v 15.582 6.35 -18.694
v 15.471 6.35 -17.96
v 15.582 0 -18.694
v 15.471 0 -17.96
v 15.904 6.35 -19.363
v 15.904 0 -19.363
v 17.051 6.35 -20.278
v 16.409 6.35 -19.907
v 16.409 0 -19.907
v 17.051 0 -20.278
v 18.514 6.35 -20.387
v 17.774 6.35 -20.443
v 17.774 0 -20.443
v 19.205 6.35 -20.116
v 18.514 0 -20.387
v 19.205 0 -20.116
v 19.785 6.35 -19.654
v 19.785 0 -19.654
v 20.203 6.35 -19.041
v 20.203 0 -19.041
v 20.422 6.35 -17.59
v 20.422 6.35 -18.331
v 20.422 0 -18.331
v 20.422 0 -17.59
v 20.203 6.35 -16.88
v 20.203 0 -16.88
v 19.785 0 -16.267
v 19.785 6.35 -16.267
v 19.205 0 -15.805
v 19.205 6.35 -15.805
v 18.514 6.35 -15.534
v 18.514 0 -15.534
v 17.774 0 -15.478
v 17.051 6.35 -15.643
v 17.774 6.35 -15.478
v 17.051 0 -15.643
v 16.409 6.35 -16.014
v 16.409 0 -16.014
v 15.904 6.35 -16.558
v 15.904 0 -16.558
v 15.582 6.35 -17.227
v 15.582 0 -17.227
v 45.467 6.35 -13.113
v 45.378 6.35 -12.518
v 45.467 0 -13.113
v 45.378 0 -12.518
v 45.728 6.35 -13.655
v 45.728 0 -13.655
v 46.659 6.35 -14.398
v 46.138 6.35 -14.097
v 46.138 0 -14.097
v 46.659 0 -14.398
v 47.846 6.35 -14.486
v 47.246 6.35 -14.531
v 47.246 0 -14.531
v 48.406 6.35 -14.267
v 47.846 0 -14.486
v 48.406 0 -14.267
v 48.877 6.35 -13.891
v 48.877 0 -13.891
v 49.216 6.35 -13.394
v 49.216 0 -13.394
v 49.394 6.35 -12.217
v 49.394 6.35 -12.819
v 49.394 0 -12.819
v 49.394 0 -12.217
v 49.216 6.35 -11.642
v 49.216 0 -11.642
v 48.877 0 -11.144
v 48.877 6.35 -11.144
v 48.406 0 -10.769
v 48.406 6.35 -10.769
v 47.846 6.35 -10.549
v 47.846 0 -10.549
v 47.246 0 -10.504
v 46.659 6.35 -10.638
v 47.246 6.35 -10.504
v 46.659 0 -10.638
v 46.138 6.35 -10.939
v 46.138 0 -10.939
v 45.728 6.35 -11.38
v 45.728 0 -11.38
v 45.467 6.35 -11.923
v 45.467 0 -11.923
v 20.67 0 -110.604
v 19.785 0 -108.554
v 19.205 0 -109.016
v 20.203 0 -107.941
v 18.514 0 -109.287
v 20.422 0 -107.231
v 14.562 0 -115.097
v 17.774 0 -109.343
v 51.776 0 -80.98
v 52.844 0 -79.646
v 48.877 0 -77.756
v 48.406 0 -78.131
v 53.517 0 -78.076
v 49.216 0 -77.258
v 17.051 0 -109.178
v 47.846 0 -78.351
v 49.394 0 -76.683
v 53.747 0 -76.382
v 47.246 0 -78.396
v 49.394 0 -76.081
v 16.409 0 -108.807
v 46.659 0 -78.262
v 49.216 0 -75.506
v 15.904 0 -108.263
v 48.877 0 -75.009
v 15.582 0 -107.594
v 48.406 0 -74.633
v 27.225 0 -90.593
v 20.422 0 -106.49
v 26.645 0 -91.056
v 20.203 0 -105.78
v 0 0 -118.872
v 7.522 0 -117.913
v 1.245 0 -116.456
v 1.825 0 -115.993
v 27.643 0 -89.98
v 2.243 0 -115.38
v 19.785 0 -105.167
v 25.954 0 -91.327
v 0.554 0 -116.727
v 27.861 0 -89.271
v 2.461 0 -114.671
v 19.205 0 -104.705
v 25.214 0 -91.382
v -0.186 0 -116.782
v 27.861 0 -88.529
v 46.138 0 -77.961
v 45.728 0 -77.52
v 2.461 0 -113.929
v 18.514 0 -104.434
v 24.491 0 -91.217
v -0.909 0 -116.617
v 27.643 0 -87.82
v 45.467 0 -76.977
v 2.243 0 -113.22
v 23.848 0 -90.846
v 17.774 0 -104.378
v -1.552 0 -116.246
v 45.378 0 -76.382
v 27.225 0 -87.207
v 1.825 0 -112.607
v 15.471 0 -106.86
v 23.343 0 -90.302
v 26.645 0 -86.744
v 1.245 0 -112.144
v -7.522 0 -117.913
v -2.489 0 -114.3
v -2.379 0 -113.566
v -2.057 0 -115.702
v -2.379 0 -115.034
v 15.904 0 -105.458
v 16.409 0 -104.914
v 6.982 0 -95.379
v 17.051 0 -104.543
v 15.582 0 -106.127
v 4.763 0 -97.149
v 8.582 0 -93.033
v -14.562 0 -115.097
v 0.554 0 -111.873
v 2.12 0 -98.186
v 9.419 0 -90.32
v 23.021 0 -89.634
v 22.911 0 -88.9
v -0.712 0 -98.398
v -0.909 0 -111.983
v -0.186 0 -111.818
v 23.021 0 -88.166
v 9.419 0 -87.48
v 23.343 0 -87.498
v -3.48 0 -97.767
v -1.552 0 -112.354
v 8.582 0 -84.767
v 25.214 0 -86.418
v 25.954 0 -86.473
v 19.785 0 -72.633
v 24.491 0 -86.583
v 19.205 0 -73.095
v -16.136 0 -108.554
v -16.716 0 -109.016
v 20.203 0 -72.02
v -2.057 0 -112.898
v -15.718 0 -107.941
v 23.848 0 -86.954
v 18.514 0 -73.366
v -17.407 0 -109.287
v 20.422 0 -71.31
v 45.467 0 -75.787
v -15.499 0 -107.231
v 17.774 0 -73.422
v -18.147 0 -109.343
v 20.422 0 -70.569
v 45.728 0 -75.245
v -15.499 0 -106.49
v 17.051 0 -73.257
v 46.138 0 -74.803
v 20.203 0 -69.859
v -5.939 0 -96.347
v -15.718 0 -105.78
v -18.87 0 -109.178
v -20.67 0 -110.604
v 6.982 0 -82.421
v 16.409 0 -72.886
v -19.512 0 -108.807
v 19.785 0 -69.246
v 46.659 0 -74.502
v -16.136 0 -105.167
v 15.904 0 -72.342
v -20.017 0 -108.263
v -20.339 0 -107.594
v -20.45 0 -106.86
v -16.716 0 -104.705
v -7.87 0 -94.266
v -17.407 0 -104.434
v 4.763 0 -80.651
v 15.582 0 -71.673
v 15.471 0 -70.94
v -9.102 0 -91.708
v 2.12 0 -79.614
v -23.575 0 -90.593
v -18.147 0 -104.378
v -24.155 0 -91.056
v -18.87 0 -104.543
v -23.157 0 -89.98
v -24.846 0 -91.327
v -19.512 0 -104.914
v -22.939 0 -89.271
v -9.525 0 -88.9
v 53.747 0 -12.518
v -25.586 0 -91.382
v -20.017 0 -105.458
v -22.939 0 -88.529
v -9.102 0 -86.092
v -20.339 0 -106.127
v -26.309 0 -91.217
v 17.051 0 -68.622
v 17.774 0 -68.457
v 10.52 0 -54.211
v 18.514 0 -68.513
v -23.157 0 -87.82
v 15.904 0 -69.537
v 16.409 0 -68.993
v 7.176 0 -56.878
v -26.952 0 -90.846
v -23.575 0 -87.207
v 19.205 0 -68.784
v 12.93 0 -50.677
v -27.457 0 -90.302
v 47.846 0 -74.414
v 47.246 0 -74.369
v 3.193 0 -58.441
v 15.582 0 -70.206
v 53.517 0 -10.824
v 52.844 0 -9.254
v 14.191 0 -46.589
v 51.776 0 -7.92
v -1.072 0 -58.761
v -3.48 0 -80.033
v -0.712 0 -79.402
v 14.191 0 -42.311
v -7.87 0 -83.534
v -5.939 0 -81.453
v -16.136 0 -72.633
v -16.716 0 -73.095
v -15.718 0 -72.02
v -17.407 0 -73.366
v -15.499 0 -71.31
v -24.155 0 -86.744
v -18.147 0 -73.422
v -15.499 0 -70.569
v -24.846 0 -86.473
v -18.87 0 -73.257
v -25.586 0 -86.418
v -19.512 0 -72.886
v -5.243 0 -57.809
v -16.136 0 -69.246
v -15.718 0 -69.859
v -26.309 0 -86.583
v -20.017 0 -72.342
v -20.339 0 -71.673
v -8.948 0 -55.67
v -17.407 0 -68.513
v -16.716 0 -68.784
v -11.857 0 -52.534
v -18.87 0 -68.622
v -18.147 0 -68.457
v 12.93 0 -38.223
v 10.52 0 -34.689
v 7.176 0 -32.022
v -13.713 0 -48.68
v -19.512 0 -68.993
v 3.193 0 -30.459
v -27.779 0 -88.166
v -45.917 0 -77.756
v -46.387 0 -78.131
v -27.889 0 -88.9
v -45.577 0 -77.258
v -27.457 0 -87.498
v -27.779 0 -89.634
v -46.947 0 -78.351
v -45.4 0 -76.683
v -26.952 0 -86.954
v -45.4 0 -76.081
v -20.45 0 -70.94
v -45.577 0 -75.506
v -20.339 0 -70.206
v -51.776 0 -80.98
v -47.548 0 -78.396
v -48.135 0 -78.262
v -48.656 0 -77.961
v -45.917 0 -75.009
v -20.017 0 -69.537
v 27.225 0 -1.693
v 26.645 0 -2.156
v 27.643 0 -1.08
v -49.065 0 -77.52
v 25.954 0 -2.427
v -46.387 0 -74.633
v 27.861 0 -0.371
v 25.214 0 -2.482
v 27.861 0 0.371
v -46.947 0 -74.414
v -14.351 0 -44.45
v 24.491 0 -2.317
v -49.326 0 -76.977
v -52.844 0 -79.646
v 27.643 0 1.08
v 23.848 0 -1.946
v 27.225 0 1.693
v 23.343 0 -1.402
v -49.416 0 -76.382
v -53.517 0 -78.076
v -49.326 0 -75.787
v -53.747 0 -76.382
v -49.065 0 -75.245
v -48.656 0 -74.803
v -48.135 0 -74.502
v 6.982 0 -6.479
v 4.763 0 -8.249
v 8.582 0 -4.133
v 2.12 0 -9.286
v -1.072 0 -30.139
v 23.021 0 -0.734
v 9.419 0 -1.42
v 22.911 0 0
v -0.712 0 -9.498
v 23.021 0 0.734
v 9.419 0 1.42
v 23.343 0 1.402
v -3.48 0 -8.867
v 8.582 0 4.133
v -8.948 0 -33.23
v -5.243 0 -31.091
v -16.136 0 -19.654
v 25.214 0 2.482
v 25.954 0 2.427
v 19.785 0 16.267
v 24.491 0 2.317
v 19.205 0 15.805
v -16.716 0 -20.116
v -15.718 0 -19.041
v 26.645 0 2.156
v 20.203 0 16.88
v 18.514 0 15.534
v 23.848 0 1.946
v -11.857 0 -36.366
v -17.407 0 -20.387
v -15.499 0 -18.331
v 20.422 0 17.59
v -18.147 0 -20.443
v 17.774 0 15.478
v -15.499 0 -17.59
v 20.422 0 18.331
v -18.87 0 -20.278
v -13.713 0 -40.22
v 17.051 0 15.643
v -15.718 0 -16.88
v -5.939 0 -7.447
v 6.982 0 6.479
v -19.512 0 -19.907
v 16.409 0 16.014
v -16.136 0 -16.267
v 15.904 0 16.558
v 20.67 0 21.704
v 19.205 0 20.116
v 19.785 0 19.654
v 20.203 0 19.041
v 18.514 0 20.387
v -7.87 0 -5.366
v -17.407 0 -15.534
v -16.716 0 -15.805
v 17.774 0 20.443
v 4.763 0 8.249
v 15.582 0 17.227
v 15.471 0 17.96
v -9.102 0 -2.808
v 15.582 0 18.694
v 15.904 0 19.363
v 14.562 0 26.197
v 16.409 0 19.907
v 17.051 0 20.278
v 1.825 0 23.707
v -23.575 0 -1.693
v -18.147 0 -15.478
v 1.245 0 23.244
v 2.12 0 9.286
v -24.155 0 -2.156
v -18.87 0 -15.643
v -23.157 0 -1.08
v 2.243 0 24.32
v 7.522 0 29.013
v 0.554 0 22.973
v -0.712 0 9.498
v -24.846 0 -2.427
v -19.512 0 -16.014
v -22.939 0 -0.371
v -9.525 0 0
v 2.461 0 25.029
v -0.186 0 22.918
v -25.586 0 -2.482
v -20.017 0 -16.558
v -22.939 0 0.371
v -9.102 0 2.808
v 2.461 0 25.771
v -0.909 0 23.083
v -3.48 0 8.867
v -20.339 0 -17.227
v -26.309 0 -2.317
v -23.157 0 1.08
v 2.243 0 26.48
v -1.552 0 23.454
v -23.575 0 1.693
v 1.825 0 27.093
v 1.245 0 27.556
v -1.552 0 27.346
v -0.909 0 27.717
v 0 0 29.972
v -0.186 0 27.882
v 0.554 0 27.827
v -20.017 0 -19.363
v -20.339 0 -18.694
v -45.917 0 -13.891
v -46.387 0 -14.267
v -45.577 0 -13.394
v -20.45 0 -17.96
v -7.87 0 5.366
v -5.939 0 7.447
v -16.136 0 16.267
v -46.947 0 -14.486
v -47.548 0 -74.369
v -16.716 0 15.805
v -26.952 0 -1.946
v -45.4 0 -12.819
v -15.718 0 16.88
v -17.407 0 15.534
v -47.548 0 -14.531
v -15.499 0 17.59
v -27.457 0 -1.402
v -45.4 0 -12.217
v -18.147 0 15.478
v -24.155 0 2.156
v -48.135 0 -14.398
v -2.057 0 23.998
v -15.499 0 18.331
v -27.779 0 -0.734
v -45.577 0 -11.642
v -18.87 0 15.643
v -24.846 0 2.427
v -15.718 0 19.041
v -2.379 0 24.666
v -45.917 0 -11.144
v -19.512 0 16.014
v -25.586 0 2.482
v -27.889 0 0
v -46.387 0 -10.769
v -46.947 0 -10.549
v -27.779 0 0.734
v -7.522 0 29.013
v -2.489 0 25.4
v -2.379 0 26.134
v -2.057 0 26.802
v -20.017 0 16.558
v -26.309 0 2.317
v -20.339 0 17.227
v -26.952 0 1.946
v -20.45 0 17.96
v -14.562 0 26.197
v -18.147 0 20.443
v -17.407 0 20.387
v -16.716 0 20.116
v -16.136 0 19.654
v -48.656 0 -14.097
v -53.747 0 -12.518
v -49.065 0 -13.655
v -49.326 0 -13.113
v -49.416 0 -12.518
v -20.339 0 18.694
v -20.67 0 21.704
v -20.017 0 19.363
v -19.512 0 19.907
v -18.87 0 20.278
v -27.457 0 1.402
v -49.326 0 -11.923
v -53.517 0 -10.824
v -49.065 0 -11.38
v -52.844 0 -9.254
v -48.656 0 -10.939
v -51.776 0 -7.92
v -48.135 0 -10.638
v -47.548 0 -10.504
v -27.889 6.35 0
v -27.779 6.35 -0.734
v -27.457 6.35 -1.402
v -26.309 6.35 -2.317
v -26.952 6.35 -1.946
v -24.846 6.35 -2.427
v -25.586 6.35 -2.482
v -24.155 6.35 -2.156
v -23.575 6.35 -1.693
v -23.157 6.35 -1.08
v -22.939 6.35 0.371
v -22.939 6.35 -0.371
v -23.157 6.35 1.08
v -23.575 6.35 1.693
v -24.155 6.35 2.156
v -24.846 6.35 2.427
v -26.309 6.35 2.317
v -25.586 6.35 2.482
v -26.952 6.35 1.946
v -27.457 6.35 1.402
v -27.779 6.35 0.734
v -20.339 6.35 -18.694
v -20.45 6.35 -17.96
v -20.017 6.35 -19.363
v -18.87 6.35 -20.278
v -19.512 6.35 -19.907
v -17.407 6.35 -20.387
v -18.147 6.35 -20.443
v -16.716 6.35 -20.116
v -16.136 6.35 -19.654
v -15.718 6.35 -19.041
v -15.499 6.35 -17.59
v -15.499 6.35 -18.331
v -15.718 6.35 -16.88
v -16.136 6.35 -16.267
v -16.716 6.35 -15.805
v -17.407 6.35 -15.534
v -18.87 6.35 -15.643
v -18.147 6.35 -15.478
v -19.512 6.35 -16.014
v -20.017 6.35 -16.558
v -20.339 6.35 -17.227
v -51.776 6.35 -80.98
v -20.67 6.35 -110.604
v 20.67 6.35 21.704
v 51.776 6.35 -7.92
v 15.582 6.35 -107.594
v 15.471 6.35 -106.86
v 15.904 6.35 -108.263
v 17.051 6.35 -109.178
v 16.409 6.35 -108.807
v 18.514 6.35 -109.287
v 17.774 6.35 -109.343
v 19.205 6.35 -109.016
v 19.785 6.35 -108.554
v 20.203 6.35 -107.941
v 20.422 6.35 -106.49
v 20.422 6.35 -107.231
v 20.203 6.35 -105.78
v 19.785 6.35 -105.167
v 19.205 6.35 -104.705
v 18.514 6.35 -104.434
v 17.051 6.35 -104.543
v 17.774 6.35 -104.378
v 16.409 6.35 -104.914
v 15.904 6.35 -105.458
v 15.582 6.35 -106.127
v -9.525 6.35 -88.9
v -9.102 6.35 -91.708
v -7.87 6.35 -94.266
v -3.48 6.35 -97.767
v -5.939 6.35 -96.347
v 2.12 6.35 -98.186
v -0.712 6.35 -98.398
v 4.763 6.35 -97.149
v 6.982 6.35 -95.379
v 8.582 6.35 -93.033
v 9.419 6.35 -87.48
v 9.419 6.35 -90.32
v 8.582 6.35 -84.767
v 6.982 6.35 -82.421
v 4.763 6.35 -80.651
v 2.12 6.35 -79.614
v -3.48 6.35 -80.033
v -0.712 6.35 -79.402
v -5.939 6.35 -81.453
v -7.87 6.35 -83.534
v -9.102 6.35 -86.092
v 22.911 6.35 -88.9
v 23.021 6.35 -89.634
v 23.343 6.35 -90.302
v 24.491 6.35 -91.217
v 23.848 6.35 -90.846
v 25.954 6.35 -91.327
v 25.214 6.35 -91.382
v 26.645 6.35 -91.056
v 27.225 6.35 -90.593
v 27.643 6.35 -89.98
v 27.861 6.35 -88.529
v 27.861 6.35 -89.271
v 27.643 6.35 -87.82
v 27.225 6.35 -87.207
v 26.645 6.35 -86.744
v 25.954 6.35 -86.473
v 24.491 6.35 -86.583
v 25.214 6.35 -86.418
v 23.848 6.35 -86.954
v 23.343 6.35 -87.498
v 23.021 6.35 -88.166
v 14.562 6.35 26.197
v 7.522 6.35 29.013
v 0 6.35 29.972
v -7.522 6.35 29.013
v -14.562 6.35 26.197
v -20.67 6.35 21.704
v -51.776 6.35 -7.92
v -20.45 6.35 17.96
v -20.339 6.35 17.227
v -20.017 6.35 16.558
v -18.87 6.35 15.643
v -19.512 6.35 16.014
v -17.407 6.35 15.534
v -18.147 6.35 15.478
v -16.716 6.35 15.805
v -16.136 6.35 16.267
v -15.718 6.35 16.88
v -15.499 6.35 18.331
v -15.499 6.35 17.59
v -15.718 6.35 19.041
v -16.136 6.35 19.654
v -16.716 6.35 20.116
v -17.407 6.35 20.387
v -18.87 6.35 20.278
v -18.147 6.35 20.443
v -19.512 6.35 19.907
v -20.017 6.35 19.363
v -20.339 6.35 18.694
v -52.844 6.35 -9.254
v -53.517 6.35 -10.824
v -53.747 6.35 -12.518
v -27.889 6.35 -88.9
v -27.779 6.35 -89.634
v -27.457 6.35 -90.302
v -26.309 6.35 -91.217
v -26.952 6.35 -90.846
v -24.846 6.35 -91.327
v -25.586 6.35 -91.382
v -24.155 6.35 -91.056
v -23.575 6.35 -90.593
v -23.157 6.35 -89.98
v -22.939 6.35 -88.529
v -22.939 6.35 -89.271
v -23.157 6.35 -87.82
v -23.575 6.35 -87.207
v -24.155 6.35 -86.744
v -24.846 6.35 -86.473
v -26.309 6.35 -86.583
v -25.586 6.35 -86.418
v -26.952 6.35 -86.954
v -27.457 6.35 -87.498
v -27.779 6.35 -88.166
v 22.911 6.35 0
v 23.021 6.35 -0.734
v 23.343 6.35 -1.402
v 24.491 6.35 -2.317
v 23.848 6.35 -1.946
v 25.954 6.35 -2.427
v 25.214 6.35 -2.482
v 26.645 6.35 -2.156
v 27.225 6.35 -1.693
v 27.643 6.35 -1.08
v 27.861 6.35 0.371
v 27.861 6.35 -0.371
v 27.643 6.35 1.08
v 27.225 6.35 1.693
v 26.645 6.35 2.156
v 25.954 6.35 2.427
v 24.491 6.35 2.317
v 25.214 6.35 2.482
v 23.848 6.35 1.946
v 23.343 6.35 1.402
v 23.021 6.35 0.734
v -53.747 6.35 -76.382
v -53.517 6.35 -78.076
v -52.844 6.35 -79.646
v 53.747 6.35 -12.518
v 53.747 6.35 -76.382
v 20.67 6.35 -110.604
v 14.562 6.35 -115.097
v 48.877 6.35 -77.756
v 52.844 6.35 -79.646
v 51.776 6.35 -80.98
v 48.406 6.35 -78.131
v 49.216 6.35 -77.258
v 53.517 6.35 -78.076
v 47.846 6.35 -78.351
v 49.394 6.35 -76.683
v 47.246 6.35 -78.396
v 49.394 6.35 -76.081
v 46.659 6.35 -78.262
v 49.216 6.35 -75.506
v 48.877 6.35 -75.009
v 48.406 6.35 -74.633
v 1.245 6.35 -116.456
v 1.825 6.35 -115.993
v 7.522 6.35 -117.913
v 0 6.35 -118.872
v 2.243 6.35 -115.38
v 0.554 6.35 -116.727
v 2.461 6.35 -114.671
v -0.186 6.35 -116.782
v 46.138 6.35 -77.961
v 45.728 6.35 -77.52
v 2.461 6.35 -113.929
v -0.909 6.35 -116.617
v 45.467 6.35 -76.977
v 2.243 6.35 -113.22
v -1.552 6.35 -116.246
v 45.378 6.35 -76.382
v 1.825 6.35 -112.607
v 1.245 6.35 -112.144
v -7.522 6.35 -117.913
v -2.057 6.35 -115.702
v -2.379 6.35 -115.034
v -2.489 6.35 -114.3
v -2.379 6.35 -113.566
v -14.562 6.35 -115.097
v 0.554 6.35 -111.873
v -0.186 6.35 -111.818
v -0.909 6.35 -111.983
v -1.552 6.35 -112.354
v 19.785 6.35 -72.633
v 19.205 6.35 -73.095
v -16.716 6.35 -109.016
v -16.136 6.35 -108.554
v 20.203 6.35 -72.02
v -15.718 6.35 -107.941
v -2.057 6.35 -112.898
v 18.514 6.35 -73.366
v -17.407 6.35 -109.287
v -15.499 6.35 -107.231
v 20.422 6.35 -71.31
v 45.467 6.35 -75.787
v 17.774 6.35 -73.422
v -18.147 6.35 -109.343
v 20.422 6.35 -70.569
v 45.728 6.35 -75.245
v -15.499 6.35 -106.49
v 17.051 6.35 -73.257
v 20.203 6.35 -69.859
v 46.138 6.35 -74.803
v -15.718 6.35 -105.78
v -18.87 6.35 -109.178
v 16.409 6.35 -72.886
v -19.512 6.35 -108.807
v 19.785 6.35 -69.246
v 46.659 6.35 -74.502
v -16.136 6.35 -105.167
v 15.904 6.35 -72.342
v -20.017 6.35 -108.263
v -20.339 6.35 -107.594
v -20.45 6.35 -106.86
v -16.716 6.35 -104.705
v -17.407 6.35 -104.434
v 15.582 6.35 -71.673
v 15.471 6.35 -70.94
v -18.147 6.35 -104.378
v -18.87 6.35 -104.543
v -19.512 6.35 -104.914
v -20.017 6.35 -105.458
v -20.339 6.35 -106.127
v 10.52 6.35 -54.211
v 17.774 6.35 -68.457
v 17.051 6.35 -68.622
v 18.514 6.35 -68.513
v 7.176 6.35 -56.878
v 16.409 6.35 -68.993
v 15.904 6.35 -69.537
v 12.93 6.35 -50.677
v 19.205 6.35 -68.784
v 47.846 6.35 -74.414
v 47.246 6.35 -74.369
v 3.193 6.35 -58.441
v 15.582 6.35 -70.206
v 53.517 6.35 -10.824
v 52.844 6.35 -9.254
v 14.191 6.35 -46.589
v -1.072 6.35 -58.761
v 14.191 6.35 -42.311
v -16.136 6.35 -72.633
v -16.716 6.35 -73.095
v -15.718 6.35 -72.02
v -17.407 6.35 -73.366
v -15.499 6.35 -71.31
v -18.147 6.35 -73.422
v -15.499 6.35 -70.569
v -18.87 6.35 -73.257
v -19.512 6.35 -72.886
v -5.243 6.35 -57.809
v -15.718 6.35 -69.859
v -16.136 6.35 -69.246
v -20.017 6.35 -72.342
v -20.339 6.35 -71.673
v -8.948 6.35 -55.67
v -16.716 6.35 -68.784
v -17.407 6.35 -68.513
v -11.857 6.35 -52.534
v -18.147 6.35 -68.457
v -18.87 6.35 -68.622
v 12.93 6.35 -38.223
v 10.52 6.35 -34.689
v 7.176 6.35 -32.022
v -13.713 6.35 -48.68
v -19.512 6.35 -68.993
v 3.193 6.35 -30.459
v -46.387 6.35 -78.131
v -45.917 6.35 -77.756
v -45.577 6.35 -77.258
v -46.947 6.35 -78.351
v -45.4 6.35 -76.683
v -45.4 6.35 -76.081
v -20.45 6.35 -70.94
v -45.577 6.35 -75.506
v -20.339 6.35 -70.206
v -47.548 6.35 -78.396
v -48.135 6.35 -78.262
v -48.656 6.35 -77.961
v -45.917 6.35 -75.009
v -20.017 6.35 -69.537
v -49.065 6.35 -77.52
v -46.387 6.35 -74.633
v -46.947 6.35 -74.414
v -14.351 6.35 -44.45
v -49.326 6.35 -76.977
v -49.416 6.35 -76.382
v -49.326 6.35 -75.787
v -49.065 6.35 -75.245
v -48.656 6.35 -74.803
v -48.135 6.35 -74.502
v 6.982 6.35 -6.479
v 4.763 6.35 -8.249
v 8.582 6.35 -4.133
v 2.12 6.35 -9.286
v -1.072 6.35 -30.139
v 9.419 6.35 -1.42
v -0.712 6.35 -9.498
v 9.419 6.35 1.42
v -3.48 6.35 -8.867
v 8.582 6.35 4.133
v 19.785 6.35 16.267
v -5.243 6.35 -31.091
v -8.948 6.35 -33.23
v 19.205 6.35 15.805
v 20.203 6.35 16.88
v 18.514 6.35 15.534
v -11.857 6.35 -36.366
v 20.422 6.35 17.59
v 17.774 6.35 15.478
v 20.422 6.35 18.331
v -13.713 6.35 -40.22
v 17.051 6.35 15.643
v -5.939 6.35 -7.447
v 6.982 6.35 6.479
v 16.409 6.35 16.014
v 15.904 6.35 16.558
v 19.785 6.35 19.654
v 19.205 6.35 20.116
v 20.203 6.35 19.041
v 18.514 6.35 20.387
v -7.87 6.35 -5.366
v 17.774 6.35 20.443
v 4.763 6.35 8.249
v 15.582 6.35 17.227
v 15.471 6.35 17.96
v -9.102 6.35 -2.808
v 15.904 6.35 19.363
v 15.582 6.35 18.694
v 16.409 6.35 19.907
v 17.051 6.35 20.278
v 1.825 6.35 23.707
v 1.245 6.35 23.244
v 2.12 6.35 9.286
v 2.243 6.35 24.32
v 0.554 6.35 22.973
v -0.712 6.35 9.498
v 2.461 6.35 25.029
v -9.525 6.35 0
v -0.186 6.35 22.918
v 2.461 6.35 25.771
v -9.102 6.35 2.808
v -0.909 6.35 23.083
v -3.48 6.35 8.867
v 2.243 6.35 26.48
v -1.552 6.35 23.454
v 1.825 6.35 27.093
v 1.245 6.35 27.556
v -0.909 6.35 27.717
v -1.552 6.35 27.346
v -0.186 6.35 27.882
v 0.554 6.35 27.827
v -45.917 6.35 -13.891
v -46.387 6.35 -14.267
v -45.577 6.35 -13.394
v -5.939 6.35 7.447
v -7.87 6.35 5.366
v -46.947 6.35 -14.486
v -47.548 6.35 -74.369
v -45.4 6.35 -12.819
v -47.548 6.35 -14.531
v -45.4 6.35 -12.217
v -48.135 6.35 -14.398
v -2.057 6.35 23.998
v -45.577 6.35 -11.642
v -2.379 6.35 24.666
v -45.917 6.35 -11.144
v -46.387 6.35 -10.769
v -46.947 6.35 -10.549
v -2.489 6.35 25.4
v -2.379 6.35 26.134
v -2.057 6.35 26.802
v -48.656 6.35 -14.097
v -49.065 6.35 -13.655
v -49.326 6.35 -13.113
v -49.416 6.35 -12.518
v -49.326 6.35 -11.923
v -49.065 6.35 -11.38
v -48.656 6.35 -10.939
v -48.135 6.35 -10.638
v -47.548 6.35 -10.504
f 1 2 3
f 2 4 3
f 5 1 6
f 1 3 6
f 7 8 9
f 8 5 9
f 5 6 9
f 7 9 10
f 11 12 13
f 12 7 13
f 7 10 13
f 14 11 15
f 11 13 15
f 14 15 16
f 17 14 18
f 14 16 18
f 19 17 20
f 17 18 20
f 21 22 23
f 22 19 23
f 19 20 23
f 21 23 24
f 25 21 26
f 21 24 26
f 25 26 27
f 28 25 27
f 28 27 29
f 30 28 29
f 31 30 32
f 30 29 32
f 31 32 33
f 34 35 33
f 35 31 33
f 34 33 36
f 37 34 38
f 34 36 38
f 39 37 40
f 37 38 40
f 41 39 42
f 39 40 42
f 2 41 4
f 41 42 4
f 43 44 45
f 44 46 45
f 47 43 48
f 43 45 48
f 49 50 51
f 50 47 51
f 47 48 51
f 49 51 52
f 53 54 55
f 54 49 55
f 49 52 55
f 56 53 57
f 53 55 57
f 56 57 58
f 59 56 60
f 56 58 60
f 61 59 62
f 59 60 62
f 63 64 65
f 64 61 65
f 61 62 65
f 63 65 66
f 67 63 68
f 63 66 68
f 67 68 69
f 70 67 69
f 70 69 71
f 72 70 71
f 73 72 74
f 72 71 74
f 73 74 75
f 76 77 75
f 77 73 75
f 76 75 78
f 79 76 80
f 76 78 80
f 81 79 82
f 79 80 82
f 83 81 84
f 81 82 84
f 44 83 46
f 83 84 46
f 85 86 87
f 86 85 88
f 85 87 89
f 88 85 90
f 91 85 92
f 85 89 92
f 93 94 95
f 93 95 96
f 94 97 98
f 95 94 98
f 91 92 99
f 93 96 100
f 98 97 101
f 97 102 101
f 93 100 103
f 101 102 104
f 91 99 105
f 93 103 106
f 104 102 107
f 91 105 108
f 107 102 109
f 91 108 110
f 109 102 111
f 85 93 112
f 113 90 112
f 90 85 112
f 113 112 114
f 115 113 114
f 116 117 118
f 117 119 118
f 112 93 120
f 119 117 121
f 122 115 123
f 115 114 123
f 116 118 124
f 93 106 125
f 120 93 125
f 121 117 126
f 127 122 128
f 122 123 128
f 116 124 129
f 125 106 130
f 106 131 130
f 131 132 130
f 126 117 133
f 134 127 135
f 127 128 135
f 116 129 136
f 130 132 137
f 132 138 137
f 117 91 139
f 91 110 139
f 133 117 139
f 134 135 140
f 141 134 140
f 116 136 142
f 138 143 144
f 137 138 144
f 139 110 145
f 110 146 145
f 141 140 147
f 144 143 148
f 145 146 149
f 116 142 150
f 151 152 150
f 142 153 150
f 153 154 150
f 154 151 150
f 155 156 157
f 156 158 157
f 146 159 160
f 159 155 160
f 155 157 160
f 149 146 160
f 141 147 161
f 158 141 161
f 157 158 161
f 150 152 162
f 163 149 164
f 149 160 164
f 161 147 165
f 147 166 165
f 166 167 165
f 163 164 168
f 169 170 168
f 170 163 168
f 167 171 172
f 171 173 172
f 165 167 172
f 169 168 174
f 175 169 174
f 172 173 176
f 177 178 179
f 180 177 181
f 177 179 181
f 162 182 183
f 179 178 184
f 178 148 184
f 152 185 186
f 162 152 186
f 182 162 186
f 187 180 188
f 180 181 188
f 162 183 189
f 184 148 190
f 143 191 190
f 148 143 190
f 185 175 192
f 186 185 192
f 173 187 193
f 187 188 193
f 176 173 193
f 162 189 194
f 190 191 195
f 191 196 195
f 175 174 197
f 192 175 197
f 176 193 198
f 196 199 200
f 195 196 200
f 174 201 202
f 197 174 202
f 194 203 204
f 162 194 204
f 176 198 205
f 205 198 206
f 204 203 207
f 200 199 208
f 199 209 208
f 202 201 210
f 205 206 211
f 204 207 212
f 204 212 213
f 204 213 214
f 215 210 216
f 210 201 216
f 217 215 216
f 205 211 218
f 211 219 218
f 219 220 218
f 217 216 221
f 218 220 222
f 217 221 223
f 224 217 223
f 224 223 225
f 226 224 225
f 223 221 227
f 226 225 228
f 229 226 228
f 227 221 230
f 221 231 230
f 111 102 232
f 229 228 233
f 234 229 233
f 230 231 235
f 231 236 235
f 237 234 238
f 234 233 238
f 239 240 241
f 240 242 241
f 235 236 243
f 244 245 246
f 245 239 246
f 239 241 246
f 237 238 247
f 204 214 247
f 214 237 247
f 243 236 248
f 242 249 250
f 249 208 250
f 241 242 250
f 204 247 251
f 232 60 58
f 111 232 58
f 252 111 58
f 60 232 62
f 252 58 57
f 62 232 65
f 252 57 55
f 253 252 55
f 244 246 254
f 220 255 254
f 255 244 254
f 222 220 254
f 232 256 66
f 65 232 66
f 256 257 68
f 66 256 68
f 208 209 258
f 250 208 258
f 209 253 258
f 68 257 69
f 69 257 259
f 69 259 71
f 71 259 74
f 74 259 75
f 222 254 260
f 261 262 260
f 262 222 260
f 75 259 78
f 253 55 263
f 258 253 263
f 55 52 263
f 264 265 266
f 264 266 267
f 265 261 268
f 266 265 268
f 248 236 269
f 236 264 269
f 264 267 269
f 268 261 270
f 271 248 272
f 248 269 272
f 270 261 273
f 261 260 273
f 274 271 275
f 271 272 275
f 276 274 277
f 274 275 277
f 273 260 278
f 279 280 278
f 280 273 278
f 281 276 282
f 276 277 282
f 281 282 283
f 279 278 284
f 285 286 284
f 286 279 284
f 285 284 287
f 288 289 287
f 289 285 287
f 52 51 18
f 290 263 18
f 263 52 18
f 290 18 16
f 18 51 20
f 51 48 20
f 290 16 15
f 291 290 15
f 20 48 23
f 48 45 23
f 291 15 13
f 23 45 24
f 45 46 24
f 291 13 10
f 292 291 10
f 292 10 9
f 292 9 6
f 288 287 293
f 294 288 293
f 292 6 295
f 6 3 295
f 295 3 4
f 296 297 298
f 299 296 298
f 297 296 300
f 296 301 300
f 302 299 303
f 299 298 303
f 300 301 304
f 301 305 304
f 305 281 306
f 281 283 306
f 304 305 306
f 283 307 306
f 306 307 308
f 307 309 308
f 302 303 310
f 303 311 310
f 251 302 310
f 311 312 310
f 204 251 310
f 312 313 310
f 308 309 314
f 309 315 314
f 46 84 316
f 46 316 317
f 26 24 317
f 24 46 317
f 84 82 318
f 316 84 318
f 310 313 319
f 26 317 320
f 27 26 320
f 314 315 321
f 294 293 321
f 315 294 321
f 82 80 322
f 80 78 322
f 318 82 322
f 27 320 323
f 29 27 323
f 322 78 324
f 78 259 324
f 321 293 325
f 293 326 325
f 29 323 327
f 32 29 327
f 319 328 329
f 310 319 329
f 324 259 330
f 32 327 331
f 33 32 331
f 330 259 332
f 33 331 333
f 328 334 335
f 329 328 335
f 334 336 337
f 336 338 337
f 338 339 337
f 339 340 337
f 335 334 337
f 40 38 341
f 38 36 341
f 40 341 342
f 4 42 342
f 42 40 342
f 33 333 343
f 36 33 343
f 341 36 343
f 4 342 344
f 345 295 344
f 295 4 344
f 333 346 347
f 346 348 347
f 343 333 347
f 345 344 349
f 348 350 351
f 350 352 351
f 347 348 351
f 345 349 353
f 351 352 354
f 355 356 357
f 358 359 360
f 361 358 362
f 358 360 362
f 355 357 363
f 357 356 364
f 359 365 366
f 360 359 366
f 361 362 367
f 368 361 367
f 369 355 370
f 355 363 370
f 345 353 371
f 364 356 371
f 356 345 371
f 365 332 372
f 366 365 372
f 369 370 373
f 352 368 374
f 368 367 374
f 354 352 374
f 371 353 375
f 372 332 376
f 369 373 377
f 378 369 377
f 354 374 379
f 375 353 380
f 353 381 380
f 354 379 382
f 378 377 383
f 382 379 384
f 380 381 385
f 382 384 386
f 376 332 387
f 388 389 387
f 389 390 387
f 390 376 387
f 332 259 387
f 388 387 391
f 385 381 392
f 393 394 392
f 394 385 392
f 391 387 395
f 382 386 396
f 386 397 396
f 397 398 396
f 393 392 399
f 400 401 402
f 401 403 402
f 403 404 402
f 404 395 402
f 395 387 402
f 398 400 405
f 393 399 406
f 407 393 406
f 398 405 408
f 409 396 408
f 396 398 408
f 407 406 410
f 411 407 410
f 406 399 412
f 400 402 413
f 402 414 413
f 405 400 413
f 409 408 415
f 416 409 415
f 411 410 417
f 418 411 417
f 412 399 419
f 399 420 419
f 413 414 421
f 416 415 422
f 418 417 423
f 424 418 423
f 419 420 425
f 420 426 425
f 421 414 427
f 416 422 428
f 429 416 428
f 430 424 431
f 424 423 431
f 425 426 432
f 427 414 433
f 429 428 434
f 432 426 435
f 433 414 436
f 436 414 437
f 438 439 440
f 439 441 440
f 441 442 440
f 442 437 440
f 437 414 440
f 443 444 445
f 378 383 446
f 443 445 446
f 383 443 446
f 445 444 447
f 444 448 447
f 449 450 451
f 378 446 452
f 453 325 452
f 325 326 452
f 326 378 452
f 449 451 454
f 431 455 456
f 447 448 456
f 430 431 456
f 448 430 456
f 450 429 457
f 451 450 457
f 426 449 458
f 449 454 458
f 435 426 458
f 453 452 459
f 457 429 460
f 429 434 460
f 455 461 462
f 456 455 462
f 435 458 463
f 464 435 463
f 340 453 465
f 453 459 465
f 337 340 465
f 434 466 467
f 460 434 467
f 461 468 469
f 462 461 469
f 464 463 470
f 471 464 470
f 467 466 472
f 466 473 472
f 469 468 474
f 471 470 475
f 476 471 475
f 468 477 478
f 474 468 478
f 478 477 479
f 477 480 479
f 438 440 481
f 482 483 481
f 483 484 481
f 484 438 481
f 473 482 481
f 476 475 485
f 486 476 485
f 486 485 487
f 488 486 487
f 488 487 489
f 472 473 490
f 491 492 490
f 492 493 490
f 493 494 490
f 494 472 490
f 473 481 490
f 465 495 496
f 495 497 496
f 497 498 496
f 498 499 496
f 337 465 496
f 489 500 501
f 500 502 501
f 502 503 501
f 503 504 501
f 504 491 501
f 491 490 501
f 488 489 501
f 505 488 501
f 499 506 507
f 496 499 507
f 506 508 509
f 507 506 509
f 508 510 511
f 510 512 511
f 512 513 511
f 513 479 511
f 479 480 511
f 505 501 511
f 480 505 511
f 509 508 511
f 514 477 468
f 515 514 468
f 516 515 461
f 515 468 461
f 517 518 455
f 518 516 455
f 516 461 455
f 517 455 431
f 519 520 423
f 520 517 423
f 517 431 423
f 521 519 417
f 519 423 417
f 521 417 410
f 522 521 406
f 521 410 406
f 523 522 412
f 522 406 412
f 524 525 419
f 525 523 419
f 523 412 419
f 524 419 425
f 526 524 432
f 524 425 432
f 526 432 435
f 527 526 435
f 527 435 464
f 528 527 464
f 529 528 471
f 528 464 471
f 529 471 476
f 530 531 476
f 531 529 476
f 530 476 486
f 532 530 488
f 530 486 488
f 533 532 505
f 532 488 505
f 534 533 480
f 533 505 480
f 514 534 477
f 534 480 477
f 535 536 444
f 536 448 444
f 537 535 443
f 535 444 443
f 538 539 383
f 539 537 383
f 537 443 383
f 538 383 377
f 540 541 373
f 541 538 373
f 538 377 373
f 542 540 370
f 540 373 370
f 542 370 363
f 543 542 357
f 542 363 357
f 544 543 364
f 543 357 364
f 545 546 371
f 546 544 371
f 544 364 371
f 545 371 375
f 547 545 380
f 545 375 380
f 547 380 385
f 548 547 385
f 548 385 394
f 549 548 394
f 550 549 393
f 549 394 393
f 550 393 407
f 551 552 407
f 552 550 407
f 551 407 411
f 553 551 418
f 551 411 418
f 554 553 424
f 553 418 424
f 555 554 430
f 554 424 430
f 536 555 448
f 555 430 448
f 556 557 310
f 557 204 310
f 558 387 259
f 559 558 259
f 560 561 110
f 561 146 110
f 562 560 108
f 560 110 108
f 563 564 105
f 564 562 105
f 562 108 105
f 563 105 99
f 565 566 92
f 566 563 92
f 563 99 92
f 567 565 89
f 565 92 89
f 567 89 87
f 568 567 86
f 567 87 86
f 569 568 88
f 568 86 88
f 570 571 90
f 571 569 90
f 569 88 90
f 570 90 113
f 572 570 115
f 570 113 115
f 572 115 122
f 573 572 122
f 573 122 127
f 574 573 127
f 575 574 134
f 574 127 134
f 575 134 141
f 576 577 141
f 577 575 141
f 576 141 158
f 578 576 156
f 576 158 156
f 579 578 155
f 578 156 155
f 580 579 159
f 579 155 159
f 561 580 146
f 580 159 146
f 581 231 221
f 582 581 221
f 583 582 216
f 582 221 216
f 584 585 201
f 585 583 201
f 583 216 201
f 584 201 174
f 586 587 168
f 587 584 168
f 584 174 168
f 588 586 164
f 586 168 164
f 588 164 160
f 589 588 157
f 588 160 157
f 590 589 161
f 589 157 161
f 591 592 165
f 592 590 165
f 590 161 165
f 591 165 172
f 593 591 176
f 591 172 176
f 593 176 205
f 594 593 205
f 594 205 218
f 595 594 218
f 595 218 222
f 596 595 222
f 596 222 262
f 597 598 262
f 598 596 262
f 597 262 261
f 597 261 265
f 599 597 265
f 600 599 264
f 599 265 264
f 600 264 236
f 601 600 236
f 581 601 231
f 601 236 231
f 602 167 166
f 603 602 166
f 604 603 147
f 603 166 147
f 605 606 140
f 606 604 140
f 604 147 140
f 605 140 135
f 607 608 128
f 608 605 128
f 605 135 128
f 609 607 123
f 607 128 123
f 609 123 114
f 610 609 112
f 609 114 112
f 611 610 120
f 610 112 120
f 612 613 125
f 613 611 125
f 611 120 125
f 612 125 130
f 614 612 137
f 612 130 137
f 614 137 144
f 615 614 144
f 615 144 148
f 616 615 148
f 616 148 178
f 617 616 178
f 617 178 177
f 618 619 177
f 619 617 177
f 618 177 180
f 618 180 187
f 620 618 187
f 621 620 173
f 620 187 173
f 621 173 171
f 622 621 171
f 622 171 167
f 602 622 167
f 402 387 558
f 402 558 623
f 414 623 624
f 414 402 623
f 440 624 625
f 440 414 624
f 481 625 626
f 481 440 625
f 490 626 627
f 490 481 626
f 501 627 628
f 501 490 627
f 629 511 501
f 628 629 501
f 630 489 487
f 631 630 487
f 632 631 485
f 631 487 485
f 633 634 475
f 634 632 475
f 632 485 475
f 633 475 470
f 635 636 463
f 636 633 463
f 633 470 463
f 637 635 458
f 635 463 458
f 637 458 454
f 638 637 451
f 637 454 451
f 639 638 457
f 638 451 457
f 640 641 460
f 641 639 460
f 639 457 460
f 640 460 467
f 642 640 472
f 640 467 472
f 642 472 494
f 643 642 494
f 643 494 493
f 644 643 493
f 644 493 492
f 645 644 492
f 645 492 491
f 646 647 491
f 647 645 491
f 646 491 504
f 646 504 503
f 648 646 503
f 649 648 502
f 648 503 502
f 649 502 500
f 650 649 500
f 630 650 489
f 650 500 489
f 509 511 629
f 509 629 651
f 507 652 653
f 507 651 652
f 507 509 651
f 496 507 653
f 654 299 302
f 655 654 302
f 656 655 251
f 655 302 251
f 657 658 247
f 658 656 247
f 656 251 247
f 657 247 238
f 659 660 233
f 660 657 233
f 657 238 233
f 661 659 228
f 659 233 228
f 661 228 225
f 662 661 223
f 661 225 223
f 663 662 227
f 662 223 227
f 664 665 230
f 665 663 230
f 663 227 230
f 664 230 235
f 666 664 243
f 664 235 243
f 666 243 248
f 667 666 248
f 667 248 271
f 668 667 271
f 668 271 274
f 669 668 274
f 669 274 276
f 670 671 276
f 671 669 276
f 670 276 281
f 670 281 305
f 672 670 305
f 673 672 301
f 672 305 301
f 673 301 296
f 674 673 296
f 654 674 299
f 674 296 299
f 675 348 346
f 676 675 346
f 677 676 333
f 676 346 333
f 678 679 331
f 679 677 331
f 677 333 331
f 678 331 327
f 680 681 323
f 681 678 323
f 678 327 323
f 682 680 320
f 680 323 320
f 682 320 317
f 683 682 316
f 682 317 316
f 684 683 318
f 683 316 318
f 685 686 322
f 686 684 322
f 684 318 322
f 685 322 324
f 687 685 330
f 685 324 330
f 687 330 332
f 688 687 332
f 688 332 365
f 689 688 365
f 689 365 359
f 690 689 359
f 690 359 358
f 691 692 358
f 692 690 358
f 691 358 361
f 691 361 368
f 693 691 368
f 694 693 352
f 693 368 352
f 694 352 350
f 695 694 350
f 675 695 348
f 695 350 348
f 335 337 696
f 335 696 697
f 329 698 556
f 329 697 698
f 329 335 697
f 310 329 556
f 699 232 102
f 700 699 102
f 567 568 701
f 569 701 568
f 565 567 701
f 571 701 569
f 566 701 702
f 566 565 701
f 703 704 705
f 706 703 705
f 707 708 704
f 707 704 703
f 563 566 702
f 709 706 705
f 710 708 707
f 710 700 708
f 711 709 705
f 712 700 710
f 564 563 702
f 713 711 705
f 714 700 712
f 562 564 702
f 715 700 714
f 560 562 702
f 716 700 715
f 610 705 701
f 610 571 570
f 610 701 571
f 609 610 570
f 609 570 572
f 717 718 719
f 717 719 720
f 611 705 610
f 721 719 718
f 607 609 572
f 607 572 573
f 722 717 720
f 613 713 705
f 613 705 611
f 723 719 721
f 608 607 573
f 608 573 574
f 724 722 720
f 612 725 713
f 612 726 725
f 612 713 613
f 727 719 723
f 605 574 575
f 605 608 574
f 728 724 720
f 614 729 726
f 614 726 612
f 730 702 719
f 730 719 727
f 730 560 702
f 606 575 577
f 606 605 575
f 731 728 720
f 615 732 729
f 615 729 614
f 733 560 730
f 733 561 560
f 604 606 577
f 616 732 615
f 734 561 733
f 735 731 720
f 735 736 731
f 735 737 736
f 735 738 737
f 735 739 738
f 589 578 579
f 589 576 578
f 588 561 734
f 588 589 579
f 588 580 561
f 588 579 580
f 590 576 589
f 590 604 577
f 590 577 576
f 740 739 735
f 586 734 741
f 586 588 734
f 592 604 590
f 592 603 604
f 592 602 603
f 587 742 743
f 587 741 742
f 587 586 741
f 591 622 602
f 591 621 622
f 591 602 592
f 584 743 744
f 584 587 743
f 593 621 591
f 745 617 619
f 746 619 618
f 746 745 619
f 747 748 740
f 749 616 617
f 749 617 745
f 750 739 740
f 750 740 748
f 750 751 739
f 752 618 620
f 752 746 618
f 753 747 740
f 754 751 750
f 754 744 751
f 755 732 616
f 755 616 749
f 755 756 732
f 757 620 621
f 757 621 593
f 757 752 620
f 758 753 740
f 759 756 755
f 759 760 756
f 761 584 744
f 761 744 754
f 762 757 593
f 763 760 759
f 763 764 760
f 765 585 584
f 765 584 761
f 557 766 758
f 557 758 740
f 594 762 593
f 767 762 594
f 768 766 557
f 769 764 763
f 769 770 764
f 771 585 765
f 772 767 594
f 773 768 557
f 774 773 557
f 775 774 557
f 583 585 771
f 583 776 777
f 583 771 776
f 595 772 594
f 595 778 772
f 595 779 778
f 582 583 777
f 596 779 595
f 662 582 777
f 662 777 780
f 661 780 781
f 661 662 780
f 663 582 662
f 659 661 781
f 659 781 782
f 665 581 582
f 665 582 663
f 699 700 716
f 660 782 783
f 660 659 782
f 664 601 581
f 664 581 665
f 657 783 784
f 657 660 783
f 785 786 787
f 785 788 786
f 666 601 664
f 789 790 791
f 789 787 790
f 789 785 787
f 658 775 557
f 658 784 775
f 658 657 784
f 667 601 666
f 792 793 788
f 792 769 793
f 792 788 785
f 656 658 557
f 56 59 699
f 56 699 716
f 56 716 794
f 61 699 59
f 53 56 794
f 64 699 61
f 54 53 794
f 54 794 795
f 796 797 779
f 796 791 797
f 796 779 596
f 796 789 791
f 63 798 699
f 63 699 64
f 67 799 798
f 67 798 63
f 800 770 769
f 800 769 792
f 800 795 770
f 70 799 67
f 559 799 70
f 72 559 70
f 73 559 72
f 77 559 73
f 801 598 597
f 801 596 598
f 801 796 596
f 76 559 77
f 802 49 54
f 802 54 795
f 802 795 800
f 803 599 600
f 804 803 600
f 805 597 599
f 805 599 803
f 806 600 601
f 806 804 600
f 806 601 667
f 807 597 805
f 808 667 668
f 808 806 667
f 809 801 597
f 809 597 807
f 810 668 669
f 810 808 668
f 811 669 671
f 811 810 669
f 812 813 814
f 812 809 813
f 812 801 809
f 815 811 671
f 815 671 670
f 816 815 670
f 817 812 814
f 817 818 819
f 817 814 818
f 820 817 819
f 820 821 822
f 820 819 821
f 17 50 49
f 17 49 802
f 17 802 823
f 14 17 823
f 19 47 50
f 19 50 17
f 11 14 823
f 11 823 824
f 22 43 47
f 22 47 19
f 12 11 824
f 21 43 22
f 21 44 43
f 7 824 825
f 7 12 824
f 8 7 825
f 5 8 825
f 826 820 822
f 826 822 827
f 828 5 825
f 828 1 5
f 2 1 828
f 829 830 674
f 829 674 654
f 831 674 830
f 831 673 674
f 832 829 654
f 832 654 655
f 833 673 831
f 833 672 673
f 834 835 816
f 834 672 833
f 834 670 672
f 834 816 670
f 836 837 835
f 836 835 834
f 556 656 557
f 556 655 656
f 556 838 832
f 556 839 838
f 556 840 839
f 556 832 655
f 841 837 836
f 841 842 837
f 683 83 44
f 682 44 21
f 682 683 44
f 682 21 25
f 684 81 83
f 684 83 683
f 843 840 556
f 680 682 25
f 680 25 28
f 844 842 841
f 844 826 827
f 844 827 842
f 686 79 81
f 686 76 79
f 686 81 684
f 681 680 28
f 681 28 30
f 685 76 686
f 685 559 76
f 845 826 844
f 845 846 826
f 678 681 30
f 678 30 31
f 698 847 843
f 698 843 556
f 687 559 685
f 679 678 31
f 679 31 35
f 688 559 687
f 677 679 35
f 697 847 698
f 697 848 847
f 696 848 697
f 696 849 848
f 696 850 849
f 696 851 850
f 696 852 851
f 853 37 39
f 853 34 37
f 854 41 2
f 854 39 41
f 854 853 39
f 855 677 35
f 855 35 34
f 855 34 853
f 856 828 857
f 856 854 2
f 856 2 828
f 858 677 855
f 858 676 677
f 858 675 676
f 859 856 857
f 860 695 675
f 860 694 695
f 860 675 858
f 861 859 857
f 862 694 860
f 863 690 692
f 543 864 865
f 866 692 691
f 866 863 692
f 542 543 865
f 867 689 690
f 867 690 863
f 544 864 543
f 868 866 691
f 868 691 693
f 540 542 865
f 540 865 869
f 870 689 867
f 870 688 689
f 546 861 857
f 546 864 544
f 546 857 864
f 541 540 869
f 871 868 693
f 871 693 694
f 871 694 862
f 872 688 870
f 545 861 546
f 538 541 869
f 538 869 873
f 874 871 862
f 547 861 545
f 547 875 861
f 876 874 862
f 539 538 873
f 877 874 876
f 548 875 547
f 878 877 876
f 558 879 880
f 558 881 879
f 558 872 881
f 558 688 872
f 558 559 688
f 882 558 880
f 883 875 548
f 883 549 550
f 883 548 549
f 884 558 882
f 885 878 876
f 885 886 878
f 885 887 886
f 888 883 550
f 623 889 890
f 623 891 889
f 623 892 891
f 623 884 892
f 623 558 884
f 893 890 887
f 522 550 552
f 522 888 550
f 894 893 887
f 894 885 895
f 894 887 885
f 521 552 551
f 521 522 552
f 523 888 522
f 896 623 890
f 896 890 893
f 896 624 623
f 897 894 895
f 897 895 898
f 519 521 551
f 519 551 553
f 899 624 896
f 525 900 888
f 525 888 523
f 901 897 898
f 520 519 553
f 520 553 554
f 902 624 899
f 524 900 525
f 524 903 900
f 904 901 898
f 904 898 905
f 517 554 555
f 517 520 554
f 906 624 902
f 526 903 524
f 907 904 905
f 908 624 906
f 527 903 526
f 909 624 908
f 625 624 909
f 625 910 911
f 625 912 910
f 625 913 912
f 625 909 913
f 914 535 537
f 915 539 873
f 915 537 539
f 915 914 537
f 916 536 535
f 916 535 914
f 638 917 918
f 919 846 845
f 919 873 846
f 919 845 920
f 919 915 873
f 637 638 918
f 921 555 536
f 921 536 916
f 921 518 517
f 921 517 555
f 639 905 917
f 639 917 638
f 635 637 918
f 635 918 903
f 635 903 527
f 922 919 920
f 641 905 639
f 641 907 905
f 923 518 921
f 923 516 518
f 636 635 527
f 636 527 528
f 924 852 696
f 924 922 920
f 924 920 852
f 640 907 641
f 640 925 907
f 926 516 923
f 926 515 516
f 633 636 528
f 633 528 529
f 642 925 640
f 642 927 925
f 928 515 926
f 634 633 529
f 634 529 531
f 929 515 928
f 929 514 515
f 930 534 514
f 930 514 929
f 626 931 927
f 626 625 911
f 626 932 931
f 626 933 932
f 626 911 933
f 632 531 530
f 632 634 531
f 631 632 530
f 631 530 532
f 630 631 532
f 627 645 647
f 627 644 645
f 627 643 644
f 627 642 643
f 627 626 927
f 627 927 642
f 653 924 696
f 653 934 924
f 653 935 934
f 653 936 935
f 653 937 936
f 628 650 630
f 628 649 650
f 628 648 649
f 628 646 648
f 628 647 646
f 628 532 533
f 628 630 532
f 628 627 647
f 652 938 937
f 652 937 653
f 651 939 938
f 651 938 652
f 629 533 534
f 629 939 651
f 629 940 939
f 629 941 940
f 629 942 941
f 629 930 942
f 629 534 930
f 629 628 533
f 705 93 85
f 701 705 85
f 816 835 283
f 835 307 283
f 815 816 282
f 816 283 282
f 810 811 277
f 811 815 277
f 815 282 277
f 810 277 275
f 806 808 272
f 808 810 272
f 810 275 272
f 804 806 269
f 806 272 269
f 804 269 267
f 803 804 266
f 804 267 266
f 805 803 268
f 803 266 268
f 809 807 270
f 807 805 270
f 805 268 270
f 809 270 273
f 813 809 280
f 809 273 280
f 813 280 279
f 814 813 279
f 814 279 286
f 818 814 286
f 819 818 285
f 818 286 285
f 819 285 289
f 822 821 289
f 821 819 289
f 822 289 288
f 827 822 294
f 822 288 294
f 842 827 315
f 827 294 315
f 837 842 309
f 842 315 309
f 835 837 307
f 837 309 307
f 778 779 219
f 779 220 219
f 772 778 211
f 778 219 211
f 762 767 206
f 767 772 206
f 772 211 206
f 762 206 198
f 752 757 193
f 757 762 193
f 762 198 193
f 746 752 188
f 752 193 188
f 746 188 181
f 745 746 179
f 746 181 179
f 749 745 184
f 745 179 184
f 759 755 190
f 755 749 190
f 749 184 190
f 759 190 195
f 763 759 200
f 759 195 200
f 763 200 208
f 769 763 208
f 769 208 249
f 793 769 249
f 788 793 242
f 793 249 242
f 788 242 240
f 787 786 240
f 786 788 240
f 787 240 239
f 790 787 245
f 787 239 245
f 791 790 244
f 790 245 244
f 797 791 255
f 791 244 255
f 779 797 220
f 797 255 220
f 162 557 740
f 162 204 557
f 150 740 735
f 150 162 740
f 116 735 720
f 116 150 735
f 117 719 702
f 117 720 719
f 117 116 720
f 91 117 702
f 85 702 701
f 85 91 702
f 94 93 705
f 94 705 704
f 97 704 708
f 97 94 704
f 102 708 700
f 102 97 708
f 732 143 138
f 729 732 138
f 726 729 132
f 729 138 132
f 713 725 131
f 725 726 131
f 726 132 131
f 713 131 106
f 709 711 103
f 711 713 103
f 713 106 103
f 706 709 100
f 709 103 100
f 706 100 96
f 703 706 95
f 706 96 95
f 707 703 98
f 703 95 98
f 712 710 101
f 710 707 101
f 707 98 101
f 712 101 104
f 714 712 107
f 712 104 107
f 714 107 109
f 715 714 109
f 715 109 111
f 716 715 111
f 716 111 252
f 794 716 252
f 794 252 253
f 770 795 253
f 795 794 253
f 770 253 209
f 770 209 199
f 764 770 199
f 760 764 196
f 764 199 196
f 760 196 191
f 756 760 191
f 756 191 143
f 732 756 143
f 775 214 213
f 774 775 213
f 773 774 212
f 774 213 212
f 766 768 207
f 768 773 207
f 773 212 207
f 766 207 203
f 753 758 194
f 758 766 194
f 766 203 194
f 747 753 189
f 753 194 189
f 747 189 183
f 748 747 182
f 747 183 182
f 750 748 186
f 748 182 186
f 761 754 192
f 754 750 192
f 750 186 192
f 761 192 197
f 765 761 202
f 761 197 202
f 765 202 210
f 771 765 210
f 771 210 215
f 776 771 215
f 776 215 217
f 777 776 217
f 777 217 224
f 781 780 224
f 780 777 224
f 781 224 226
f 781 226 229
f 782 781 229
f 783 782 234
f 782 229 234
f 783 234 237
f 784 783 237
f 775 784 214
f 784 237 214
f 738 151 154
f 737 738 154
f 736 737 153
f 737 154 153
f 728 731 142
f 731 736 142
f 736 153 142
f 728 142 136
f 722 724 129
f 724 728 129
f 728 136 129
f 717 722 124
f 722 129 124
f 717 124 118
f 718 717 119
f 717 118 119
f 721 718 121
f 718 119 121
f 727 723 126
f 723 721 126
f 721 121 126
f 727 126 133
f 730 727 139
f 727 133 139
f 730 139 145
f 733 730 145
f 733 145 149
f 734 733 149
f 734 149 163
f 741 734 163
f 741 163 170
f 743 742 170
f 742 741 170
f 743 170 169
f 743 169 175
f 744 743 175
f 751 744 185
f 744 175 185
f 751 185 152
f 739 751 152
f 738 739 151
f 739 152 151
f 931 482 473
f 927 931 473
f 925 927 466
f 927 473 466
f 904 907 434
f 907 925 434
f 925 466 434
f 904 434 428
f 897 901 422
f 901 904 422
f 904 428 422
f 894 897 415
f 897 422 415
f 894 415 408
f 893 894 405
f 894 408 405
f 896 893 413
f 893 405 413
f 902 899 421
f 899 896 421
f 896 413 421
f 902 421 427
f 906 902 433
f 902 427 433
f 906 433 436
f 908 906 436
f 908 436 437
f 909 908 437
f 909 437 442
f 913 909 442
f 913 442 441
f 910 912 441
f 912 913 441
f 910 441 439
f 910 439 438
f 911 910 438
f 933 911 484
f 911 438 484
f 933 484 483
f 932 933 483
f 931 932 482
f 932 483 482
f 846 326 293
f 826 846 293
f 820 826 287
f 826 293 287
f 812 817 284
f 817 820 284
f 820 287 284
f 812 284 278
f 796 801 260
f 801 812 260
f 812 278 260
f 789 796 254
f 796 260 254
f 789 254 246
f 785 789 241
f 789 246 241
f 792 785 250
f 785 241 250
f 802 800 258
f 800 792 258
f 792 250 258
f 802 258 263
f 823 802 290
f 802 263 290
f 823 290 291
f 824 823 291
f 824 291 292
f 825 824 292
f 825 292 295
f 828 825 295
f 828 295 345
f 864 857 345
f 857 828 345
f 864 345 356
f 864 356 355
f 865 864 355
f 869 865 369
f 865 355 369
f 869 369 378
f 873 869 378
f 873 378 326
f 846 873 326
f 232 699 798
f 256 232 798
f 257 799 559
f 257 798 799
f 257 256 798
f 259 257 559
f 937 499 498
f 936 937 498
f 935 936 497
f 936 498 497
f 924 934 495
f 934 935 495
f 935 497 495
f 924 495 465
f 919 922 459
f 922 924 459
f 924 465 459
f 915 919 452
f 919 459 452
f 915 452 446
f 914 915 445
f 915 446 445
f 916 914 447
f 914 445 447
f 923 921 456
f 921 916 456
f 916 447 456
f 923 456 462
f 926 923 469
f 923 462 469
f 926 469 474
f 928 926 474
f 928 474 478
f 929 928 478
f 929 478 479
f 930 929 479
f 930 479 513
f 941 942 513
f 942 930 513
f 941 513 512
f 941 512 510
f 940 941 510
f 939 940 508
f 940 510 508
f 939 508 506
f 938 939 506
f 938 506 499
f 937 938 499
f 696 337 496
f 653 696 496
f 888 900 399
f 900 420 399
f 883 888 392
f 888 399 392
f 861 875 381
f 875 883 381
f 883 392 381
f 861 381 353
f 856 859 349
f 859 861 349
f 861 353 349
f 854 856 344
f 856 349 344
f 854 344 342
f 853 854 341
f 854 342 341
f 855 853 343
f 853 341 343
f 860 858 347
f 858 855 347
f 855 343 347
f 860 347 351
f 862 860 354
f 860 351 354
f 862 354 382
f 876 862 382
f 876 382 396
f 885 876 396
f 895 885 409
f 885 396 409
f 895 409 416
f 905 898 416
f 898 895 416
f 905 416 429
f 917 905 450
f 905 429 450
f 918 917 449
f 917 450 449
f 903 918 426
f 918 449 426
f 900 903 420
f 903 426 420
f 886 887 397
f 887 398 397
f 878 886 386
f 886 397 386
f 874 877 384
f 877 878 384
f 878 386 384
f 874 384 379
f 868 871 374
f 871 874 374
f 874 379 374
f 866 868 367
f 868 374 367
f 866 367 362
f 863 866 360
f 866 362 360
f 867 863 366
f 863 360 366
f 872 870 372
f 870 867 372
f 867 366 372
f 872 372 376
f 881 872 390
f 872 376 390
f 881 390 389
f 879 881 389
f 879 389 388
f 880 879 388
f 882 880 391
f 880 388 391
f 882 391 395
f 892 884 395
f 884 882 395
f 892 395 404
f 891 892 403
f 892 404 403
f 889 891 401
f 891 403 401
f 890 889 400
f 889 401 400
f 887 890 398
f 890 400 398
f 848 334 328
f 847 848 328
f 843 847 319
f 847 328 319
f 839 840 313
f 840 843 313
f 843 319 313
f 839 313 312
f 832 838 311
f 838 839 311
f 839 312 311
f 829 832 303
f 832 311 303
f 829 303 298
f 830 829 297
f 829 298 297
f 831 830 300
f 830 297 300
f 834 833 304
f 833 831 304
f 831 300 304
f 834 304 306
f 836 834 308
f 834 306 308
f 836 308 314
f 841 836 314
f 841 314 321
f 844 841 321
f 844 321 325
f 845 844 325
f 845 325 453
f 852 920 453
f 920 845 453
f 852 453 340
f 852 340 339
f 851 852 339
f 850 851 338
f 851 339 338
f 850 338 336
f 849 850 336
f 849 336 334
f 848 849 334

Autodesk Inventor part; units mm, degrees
ref_plane "YZ Plane" through (0, 0, 0) normal (1, 0, 0) x (0, 1, 0)
ref_plane "XZ Plane" through (0, 0, 0) normal (0, 1, 0) x (-1, 0, 0)
ref_plane "XY Plane" through (0, 0, 0) normal (0, 0, 1) x (1, 0, 0)
sketch "Sketch1" plane through (0, 0, 0) normal (0, 1, 0) x (-1, 0, 0)
  point P0 (0, 0)
sketch "Sketch2" plane through (0, 0, 0) normal (0, 1, 0) x (-1, 0, 0)
  circle A0 centre (0, 0) radius 6.35 construction
  circle A1 centre (0, -44.45) radius 38.1 construction
  circle A2 centre (0, 0) radius 25.4 construction
  circle A3 centre (17.9605, -17.9605) radius 2.4892
  circle A4 centre (25.4, 0) radius 2.4892
  circle A5 centre (17.9605, 17.9605) radius 2.4892
  circle A6 centre (0, 25.4) radius 2.4892
  circle A7 centre (-17.9605, 17.9605) radius 2.4892
  circle A8 centre (-25.4, 0) radius 2.4892
  circle A9 centre (-17.9605, -17.9605) radius 2.4892
  circle A10 centre (0, -25.4) radius 2.4892 construction
  circle A11 centre (0, -88.9) radius 25.4 construction
  circle A12 centre (0, -88.9) radius 6.35 construction
  circle A13 centre (-17.9605, -70.9395) radius 2.4892
  circle A14 centre (-25.4, -88.9) radius 2.4892
  circle A15 centre (-17.9605, -106.8605) radius 2.4892
  circle A16 centre (0, -114.3) radius 2.4892
  circle A17 centre (17.9605, -106.8605) radius 2.4892
  circle A18 centre (25.4, -88.9) radius 2.4892
  circle A19 centre (17.9605, -70.9395) radius 2.4892
  circle A20 centre (0, -63.5) radius 2.4892 construction
  circle A21 centre (0, 0) radius 9.525
  circle A22 centre (0, -88.9) radius 9.525
  circle A23 centre (47.3968, -12.5178) radius 6.35 construction
  circle A24 centre (47.3968, -76.3822) radius 6.35 construction
  circle A25 centre (-47.3968, -76.3822) radius 6.35 construction
  circle A26 centre (0, 0) radius 29.972 construction
  circle A27 centre (0, -88.9) radius 29.972 construction
  circle A28 centre (-47.3968, -12.5178) radius 6.35 construction
  circle A29 centre (47.3968, -12.5178) radius 2.0193
  circle A30 centre (47.3968, -76.3822) radius 2.0193
  circle A31 centre (-47.3968, -12.5178) radius 2.0193
  circle A32 centre (-47.3968, -76.3822) radius 2.0193
  line L0 (42.1305, -72.8341) -> (31.5979, -65.7381) construction
  line L1 (41.2573, -78.0036) -> (28.9784, -81.2466) construction
  line L2 (-41.2573, -78.0036) -> (-28.9784, -81.2466) construction
  line L3 (-42.1305, -72.8341) -> (-31.5979, -65.7381) construction
  line L4 (-41.2573, -10.8964) -> (-28.9784, -7.6534) construction
  line L5 (-42.1305, -16.0659) -> (-31.5979, -23.1619) construction
  line L6 (41.2573, -10.8964) -> (28.9784, -7.6534) construction
  line L7 (42.1305, -16.0659) -> (31.5979, -23.1619) construction
  line L8 (-20.6699, 21.7043) -> (-51.7761, -7.9195)
  line L9 (-53.7468, -12.5178) -> (-53.7468, -76.3822)
  line L10 (-51.7761, -80.9805) -> (-20.6699, -110.6043)
  line L11 (20.6699, -110.6043) -> (51.7761, -80.9805)
  line L12 (53.7468, -76.3822) -> (53.7468, -12.5178)
  line L13 (51.7761, -7.9195) -> (20.6699, 21.7043)
  arc A33 (20.6699, 21.7043) -> (-20.6699, 21.7043) centre (0, 0) ccw
  arc A34 (-51.7761, -7.9195) -> (-53.7468, -12.5178) centre (-47.3968, -12.5178) ccw
  arc A35 (-53.7468, -76.3822) -> (-51.7761, -80.9805) centre (-47.3968, -76.3822) ccw
  arc A36 (-20.6699, -110.6043) -> (20.6699, -110.6043) centre (0, -88.9) ccw
  arc A37 (51.7761, -80.9805) -> (53.7468, -76.3822) centre (47.3968, -76.3822) ccw
  arc A38 (53.7468, -12.5178) -> (51.7761, -7.9195) centre (47.3968, -12.5178) ccw
  circle A39 centre (0, -44.45) radius 14.351
  dimension "d2" = 50.8
  dimension "d0" = 12.7
  dimension "d1" = 76.2
  dimension "d3" = 4.9784
  dimension "d6" = 360
  dimension "d8" = 4.9784
  dimension "d11" = 360
  dimension "d13" = 19.05
  dimension "d14" = 19.05
  dimension "d15" = 59.944
  dimension "d16" = 59.944
  dimension "d17" = 12.7
  dimension "d18" = 4.0386
  dimension "d24" = 12.7
  dimension "d25" = 28.702
extrude "Extrusion1" add sketch "Sketch2" along normal blind 6.35
properties part number "Bottom Plate"
